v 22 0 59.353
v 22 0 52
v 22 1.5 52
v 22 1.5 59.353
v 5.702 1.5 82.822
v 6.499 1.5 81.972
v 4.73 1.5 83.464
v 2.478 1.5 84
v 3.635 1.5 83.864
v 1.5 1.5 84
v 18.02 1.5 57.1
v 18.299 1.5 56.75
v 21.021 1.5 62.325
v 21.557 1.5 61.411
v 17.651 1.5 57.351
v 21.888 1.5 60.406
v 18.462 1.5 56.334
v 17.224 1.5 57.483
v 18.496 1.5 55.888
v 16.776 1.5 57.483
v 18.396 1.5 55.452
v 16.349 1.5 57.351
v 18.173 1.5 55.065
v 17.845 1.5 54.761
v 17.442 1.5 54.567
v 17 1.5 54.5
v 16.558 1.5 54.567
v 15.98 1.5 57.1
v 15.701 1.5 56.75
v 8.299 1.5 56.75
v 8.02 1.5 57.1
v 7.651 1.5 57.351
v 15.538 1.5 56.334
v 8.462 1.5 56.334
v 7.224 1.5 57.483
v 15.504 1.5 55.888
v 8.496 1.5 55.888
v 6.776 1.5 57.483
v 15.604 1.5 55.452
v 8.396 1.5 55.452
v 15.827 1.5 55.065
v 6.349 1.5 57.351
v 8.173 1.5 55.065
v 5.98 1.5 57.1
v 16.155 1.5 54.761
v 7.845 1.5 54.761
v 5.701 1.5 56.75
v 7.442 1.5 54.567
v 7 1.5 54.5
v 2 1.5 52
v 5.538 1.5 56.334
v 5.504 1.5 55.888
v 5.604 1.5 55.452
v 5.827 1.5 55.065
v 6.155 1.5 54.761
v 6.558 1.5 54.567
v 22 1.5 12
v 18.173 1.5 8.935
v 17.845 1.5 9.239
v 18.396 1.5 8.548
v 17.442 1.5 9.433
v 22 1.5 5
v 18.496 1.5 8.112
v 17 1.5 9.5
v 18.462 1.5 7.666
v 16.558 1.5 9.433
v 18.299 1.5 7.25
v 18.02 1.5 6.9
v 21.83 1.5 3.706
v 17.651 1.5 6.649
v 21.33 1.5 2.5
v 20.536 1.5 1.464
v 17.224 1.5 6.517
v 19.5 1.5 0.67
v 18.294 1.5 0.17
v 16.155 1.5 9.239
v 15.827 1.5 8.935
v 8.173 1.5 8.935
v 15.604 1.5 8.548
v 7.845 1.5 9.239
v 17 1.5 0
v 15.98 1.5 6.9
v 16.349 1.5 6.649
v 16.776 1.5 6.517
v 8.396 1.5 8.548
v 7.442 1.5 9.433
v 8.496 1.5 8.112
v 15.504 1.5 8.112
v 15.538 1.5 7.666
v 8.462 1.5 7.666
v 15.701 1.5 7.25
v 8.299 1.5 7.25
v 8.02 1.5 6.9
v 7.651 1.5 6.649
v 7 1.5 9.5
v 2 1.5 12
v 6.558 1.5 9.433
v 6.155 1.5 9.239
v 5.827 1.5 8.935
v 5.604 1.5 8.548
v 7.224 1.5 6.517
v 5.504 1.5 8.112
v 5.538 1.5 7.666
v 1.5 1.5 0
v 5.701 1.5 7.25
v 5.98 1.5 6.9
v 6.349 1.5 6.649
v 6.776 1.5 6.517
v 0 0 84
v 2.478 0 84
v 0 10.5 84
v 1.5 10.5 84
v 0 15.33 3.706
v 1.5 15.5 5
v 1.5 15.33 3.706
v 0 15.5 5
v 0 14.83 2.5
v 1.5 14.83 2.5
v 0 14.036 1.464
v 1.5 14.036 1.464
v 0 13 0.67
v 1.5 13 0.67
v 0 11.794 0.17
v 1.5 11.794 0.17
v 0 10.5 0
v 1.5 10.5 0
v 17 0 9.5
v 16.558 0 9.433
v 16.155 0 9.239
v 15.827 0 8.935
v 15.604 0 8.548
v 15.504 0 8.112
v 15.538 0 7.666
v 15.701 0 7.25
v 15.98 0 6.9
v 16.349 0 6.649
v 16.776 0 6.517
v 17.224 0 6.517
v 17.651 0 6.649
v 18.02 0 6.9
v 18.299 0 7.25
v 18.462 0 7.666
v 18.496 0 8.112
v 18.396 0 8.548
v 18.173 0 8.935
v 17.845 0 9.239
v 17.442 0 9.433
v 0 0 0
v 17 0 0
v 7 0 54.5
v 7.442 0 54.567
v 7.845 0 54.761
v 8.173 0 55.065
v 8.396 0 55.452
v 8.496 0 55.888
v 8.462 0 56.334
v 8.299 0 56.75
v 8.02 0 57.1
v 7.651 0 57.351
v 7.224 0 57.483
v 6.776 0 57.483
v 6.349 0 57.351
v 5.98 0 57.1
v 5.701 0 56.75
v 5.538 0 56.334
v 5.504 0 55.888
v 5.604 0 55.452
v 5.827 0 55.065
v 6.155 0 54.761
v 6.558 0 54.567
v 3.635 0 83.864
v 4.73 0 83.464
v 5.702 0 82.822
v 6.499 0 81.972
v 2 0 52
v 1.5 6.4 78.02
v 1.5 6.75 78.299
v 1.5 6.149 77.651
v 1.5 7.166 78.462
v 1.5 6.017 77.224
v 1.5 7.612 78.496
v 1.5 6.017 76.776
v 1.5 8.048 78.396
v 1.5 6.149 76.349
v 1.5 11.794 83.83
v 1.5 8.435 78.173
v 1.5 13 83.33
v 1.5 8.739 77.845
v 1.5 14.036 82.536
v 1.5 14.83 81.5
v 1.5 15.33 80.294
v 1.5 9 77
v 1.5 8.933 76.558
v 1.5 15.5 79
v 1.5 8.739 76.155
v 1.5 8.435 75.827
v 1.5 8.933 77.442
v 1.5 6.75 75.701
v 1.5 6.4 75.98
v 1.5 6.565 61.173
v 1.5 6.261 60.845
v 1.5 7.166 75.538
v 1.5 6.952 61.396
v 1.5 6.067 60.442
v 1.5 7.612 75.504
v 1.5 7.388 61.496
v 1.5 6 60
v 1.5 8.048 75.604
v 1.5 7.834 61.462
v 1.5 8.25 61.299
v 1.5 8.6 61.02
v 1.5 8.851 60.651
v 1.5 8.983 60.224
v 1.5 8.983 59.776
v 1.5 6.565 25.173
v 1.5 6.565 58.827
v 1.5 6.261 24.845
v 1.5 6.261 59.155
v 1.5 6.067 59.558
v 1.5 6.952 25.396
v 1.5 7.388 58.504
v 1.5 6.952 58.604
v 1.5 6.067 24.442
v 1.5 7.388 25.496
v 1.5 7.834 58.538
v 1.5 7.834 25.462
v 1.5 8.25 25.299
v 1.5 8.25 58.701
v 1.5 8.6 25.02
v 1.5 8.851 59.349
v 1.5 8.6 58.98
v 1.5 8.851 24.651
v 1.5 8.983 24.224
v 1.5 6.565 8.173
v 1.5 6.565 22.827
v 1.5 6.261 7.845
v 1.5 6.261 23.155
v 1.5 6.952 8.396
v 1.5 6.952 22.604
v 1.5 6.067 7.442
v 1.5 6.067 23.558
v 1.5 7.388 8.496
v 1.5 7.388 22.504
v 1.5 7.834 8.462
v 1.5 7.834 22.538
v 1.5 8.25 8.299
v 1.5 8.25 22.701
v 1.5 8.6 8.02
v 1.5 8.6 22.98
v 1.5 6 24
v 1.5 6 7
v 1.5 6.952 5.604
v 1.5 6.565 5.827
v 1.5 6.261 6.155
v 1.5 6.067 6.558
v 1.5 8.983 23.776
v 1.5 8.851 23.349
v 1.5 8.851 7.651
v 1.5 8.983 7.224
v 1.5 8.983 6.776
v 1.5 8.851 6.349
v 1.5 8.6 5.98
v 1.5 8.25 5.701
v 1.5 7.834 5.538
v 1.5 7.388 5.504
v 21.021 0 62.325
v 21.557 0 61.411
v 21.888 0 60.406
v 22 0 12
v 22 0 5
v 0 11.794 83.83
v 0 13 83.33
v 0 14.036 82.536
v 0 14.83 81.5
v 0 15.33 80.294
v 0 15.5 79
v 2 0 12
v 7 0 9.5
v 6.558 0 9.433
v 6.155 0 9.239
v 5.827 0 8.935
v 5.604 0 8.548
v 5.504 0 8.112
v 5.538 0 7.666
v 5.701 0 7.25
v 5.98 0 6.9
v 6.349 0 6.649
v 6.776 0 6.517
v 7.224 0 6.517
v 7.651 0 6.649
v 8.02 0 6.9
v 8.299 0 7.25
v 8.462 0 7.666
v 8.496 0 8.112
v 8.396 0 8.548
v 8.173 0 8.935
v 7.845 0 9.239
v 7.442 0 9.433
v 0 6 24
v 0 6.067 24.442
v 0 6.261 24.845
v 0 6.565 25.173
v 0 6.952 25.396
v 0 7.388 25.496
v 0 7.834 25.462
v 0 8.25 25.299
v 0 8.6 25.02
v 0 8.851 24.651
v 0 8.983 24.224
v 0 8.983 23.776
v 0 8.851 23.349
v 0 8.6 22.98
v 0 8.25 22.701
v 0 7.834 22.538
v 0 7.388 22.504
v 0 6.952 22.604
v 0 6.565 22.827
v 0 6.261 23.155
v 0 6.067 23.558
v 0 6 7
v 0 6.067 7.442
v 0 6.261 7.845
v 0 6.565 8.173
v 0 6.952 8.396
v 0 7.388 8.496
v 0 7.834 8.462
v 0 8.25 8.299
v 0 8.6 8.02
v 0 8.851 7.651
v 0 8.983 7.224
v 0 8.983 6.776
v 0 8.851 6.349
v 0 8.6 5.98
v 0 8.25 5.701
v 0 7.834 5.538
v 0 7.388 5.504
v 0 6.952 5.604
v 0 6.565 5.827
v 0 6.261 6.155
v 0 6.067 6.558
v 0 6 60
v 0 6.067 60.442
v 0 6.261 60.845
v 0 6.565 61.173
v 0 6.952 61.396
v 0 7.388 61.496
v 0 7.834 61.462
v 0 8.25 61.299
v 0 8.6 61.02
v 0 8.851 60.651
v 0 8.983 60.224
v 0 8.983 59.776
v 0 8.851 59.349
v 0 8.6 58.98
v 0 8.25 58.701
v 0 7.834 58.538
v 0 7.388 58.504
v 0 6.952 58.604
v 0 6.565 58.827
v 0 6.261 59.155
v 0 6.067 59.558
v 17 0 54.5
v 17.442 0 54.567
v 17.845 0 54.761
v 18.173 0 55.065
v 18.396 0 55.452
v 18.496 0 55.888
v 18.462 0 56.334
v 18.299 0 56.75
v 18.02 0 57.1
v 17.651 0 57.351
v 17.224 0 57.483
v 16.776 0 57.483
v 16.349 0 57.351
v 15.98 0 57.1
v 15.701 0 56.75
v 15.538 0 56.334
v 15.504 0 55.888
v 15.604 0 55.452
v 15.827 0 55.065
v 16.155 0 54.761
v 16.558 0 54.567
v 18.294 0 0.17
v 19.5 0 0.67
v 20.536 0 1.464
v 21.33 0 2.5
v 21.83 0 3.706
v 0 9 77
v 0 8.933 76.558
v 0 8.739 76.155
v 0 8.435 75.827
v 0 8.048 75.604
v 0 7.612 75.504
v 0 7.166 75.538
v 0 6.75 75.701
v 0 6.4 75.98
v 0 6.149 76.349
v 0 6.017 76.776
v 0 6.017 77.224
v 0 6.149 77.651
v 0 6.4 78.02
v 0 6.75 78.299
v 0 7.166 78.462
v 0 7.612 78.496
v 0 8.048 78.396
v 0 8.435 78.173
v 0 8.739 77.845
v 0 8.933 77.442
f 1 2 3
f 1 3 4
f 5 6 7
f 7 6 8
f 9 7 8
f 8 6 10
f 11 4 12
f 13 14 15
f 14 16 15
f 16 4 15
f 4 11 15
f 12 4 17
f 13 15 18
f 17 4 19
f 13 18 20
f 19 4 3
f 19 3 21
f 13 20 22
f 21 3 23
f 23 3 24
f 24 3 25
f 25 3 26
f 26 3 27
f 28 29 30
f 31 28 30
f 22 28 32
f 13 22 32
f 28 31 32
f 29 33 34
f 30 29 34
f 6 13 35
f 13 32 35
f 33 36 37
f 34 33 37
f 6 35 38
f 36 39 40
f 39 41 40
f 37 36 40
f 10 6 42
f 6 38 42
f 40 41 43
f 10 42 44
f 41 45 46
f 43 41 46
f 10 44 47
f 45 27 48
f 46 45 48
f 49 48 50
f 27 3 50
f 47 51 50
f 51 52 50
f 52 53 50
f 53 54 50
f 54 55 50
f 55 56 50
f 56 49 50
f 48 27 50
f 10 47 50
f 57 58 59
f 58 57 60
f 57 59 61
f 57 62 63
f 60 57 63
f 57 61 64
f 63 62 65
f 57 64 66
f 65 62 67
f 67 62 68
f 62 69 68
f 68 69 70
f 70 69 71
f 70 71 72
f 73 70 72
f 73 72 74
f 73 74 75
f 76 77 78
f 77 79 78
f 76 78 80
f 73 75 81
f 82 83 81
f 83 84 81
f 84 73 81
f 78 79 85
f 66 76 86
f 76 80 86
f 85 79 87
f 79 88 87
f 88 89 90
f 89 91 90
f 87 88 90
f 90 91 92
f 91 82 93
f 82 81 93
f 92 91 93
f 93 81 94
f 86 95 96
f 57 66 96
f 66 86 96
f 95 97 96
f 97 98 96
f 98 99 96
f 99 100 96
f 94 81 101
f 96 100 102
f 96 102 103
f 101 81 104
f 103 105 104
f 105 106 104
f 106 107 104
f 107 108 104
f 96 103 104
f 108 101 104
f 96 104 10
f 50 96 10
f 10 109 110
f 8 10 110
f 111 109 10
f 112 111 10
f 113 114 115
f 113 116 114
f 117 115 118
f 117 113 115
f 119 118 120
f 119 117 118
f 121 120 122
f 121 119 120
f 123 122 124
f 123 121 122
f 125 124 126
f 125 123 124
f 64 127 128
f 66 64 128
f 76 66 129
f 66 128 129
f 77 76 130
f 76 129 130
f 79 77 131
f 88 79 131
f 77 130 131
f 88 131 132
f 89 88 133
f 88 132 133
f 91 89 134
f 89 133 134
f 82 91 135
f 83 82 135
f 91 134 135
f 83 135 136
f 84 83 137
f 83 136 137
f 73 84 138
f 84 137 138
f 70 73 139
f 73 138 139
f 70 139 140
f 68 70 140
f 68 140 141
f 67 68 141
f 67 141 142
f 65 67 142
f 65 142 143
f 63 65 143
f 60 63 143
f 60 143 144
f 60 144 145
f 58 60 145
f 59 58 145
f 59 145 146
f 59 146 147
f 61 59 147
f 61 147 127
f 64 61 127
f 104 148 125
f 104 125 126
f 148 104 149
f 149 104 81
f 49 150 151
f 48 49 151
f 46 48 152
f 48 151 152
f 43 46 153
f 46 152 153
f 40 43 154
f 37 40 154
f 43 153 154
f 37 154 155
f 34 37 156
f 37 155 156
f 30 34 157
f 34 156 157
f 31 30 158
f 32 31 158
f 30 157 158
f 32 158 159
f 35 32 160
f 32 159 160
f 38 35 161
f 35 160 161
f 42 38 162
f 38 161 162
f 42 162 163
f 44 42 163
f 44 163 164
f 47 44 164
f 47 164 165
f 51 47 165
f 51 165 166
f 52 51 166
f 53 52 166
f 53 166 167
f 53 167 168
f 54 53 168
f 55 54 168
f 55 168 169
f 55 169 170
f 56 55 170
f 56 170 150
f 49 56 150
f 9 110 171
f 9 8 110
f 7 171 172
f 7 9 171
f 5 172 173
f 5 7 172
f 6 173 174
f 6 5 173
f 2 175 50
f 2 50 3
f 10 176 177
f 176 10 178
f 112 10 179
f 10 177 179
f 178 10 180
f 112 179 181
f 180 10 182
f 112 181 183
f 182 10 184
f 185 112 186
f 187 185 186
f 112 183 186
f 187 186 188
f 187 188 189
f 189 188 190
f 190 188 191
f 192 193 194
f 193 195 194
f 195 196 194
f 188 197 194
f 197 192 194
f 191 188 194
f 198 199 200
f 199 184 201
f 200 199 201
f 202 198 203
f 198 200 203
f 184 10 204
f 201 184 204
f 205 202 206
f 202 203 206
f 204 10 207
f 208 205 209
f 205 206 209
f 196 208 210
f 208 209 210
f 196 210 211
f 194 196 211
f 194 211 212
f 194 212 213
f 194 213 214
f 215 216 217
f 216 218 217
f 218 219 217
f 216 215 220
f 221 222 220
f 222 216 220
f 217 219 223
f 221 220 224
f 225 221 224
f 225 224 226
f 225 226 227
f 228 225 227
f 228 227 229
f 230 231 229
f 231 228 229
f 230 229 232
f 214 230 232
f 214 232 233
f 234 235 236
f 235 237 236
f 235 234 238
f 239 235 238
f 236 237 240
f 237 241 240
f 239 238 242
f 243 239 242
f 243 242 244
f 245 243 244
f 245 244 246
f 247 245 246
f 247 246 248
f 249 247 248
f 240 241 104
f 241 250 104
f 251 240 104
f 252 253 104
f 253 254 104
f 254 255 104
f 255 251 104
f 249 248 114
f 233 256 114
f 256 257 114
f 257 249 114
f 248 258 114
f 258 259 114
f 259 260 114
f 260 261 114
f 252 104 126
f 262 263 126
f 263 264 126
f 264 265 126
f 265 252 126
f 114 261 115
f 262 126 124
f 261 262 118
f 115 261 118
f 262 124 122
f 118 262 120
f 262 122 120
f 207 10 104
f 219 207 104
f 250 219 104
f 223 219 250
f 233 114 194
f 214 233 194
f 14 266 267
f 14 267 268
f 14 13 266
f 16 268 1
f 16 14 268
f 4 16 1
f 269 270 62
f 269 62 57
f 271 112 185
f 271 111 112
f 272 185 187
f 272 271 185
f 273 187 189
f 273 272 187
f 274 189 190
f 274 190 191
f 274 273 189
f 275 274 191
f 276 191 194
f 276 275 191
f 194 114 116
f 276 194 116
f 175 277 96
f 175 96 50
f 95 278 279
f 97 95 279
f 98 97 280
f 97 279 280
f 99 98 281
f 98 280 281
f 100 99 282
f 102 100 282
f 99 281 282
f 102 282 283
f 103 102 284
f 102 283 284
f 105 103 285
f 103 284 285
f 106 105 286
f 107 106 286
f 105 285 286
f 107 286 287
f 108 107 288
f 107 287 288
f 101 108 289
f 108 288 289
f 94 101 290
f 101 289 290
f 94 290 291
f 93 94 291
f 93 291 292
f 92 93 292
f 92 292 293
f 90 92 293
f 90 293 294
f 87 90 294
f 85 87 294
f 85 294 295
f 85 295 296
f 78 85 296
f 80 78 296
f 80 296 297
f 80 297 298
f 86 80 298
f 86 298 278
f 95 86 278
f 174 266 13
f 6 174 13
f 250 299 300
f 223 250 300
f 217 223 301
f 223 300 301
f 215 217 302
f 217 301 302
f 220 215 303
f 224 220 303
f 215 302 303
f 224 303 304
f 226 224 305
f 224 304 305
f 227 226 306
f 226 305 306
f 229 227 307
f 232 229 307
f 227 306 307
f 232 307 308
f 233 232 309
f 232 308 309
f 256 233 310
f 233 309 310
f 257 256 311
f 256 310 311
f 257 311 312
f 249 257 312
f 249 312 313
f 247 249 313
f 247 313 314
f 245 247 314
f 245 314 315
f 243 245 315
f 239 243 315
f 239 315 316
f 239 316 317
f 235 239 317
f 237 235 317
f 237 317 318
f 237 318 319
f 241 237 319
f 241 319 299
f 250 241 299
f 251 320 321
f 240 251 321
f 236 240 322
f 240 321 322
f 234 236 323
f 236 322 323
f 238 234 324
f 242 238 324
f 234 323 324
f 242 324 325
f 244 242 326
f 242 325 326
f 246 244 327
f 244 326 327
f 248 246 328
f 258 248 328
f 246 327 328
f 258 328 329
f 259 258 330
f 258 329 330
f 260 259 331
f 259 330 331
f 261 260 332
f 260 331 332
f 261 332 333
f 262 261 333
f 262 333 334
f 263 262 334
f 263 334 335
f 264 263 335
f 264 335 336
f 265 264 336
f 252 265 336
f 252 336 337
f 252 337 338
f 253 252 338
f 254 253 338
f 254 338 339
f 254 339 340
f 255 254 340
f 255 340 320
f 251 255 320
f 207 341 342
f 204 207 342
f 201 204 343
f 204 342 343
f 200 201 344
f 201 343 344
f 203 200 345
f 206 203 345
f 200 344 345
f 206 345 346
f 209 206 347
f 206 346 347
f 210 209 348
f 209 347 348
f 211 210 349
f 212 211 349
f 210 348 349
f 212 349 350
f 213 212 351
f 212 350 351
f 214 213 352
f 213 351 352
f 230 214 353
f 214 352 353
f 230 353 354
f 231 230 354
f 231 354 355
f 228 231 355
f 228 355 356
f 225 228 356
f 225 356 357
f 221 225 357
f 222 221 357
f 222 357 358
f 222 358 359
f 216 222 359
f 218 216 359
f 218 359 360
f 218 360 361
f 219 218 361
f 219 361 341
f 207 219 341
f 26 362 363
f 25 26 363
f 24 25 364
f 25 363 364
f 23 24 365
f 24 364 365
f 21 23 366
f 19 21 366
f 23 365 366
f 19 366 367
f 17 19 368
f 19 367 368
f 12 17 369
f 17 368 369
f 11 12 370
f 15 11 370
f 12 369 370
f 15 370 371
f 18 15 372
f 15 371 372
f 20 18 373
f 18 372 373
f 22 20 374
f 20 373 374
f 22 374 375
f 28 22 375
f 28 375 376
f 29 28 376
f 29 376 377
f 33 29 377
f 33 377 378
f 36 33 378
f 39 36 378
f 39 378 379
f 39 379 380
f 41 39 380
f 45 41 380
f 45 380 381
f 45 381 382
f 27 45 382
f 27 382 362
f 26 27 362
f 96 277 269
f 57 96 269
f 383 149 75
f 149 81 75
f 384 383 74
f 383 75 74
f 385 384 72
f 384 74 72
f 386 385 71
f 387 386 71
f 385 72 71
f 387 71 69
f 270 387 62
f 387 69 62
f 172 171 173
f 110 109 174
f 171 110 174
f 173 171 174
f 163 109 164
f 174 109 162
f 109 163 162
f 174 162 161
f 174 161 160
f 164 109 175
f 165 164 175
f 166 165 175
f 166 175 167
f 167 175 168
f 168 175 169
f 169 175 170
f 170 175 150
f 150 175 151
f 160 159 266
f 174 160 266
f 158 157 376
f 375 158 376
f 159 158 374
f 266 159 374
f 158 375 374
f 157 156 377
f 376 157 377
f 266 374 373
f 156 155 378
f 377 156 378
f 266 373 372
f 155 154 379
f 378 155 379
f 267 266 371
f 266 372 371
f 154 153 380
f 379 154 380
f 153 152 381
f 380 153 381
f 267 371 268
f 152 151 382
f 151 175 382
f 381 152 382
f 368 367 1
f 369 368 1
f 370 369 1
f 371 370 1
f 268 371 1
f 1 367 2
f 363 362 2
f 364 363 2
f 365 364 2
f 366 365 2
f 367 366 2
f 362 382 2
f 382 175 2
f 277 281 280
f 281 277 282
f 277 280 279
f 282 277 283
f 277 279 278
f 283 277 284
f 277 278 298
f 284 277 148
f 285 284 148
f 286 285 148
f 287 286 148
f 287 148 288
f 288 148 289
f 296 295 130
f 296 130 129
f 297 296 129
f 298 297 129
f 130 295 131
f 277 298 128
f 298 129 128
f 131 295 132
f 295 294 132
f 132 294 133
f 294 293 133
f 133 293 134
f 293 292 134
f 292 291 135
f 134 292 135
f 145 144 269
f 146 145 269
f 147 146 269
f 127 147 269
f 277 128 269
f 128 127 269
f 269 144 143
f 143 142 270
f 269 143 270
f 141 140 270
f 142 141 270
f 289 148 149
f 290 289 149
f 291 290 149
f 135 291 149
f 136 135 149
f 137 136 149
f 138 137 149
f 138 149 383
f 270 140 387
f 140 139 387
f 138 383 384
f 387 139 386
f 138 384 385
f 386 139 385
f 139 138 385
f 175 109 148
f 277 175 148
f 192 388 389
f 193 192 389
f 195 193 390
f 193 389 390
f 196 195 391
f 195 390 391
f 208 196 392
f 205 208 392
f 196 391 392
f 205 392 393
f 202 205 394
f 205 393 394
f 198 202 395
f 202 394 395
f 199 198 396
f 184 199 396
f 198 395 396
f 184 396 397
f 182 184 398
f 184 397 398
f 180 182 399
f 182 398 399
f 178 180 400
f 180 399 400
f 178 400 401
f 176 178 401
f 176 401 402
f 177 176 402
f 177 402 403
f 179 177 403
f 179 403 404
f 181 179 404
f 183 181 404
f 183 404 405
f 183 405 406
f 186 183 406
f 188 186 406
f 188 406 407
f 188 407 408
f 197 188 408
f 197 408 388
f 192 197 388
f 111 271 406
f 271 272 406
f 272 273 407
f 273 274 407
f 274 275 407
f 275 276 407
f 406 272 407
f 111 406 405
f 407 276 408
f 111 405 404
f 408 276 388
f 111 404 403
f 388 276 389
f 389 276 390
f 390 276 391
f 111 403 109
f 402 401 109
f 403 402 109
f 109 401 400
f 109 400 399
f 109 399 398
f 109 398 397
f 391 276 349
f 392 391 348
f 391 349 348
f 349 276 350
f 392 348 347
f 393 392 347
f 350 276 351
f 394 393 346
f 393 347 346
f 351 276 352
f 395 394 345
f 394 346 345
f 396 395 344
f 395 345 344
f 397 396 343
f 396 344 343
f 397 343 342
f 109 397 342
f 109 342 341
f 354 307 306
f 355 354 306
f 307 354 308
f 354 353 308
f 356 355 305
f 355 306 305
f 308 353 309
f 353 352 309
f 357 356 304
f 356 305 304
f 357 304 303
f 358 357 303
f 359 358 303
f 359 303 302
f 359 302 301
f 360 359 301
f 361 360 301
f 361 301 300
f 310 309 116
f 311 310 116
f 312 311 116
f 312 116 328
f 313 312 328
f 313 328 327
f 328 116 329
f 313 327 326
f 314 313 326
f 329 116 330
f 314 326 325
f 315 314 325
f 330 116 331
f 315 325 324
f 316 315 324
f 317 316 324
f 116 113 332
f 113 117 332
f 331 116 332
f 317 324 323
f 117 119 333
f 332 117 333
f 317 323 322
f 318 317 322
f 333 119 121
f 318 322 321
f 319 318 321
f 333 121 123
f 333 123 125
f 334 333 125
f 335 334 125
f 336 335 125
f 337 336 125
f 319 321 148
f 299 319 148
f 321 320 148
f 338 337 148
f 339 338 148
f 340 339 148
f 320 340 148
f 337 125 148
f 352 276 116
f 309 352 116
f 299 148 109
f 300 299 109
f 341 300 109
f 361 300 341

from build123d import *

# Parameters (mm, degrees)
EXTRU_MINCE1_DEPTH      = 84
ESQUISSE2_R             = 1.5
ENL_V_MAT_EXTRU_1_DEPTH = 8
ESQUISSE3_R             = 1.5
ESQUISSE3_W             = 25.5
ESQUISSE3_H             = 40
ENL_V_MAT_EXTRU_2_DEPTH = 5
ESQUISSE4_W             = 5.5
ESQUISSE4_H             = 84
ENL_V_MAT_EXTRU_3_DEPTH = 6
CHANFREIN1_SIZE         = 17
CHANFREIN1_SIZE2        = 23
CONG_1_R                = 5


with BuildPart() as part:
    # Esquisse1 → Extru.-Mince1 (new body)
    with BuildSketch(Plane.XY):
        Polygon((0, 15.5), (0, 0), (27.5, 0), (27.5, 1.5), (1.5, 1.5), (1.5, 15.5), align=None)
    extrude(amount=EXTRU_MINCE1_DEPTH)

    # Esquisse2 → Enlèv. mat.-Extru.1 (cut)
    with BuildSketch(Plane.ZY):
        with Locations(Location((7, 7.5, 0), (0, 0, 270))):
            Circle(ESQUISSE2_R)
        with Locations(Location((24, 7.5, 0), (0, 0, 270))):
            Circle(ESQUISSE2_R)
        with Locations(Location((60, 7.5, 0), (0, 0, 270))):
            Circle(ESQUISSE2_R)
        with Locations(Location((77, 7.5, 0), (0, 0, 90))):
            Circle(ESQUISSE2_R)
    extrude(amount=-ENL_V_MAT_EXTRU_1_DEPTH, mode=Mode.SUBTRACT)

    # Esquisse3 → Enlèv. mat.-Extru.2 (cut)
    with BuildSketch(Plane.XZ):
        with Locations(Location((7, 56, 0), (0, 0, 270))):
            Circle(ESQUISSE3_R)
        with Locations(Location((17, 56, 0), (0, 0, 270))):
            Circle(ESQUISSE3_R)
        with Locations(Location((17, 8, 0), (0, 0, 90))):
            Circle(ESQUISSE3_R)
        with Locations(Location((7, 8, 0), (0, 0, 90))):
            Circle(ESQUISSE3_R)
        with Locations((14.75, 32)):
            Rectangle(ESQUISSE3_W, ESQUISSE3_H)
    extrude(amount=-ENL_V_MAT_EXTRU_2_DEPTH, mode=Mode.SUBTRACT)

    # Esquisse4 → Enlèv. mat.-Extru.3 (cut)
    with BuildSketch(Plane.XZ):
        with Locations((24.75, 42)):
            Rectangle(ESQUISSE4_W, ESQUISSE4_H)
    extrude(amount=-ENL_V_MAT_EXTRU_3_DEPTH, mode=Mode.SUBTRACT)

    # Chanfrein1
    chanfrein1_edges = [part.edges().sort_by_distance(p)[0] for p in [
        (22, 0.75, 84),
    ]]
    chanfrein1_side = [part.faces().sort_by_distance(p)[0] for p in [
        (0.75, 15.230881067, 84),
    ]]
    chamfer(chanfrein1_edges, length=CHANFREIN1_SIZE, length2=CHANFREIN1_SIZE2, reference=chanfrein1_side[0])

    # Congé1
    cong_1_edges = [part.edges().sort_by_distance(p)[0] for p in [
        (22, 0.75, 61),
        (5, 0.75, 84),
        (0.75, 15.5, 84),
        (0.75, 15.5, 0),
        (22, 0.75, 0),
    ]]
    fillet(cong_1_edges, radius=CONG_1_R)


solid = part.part
